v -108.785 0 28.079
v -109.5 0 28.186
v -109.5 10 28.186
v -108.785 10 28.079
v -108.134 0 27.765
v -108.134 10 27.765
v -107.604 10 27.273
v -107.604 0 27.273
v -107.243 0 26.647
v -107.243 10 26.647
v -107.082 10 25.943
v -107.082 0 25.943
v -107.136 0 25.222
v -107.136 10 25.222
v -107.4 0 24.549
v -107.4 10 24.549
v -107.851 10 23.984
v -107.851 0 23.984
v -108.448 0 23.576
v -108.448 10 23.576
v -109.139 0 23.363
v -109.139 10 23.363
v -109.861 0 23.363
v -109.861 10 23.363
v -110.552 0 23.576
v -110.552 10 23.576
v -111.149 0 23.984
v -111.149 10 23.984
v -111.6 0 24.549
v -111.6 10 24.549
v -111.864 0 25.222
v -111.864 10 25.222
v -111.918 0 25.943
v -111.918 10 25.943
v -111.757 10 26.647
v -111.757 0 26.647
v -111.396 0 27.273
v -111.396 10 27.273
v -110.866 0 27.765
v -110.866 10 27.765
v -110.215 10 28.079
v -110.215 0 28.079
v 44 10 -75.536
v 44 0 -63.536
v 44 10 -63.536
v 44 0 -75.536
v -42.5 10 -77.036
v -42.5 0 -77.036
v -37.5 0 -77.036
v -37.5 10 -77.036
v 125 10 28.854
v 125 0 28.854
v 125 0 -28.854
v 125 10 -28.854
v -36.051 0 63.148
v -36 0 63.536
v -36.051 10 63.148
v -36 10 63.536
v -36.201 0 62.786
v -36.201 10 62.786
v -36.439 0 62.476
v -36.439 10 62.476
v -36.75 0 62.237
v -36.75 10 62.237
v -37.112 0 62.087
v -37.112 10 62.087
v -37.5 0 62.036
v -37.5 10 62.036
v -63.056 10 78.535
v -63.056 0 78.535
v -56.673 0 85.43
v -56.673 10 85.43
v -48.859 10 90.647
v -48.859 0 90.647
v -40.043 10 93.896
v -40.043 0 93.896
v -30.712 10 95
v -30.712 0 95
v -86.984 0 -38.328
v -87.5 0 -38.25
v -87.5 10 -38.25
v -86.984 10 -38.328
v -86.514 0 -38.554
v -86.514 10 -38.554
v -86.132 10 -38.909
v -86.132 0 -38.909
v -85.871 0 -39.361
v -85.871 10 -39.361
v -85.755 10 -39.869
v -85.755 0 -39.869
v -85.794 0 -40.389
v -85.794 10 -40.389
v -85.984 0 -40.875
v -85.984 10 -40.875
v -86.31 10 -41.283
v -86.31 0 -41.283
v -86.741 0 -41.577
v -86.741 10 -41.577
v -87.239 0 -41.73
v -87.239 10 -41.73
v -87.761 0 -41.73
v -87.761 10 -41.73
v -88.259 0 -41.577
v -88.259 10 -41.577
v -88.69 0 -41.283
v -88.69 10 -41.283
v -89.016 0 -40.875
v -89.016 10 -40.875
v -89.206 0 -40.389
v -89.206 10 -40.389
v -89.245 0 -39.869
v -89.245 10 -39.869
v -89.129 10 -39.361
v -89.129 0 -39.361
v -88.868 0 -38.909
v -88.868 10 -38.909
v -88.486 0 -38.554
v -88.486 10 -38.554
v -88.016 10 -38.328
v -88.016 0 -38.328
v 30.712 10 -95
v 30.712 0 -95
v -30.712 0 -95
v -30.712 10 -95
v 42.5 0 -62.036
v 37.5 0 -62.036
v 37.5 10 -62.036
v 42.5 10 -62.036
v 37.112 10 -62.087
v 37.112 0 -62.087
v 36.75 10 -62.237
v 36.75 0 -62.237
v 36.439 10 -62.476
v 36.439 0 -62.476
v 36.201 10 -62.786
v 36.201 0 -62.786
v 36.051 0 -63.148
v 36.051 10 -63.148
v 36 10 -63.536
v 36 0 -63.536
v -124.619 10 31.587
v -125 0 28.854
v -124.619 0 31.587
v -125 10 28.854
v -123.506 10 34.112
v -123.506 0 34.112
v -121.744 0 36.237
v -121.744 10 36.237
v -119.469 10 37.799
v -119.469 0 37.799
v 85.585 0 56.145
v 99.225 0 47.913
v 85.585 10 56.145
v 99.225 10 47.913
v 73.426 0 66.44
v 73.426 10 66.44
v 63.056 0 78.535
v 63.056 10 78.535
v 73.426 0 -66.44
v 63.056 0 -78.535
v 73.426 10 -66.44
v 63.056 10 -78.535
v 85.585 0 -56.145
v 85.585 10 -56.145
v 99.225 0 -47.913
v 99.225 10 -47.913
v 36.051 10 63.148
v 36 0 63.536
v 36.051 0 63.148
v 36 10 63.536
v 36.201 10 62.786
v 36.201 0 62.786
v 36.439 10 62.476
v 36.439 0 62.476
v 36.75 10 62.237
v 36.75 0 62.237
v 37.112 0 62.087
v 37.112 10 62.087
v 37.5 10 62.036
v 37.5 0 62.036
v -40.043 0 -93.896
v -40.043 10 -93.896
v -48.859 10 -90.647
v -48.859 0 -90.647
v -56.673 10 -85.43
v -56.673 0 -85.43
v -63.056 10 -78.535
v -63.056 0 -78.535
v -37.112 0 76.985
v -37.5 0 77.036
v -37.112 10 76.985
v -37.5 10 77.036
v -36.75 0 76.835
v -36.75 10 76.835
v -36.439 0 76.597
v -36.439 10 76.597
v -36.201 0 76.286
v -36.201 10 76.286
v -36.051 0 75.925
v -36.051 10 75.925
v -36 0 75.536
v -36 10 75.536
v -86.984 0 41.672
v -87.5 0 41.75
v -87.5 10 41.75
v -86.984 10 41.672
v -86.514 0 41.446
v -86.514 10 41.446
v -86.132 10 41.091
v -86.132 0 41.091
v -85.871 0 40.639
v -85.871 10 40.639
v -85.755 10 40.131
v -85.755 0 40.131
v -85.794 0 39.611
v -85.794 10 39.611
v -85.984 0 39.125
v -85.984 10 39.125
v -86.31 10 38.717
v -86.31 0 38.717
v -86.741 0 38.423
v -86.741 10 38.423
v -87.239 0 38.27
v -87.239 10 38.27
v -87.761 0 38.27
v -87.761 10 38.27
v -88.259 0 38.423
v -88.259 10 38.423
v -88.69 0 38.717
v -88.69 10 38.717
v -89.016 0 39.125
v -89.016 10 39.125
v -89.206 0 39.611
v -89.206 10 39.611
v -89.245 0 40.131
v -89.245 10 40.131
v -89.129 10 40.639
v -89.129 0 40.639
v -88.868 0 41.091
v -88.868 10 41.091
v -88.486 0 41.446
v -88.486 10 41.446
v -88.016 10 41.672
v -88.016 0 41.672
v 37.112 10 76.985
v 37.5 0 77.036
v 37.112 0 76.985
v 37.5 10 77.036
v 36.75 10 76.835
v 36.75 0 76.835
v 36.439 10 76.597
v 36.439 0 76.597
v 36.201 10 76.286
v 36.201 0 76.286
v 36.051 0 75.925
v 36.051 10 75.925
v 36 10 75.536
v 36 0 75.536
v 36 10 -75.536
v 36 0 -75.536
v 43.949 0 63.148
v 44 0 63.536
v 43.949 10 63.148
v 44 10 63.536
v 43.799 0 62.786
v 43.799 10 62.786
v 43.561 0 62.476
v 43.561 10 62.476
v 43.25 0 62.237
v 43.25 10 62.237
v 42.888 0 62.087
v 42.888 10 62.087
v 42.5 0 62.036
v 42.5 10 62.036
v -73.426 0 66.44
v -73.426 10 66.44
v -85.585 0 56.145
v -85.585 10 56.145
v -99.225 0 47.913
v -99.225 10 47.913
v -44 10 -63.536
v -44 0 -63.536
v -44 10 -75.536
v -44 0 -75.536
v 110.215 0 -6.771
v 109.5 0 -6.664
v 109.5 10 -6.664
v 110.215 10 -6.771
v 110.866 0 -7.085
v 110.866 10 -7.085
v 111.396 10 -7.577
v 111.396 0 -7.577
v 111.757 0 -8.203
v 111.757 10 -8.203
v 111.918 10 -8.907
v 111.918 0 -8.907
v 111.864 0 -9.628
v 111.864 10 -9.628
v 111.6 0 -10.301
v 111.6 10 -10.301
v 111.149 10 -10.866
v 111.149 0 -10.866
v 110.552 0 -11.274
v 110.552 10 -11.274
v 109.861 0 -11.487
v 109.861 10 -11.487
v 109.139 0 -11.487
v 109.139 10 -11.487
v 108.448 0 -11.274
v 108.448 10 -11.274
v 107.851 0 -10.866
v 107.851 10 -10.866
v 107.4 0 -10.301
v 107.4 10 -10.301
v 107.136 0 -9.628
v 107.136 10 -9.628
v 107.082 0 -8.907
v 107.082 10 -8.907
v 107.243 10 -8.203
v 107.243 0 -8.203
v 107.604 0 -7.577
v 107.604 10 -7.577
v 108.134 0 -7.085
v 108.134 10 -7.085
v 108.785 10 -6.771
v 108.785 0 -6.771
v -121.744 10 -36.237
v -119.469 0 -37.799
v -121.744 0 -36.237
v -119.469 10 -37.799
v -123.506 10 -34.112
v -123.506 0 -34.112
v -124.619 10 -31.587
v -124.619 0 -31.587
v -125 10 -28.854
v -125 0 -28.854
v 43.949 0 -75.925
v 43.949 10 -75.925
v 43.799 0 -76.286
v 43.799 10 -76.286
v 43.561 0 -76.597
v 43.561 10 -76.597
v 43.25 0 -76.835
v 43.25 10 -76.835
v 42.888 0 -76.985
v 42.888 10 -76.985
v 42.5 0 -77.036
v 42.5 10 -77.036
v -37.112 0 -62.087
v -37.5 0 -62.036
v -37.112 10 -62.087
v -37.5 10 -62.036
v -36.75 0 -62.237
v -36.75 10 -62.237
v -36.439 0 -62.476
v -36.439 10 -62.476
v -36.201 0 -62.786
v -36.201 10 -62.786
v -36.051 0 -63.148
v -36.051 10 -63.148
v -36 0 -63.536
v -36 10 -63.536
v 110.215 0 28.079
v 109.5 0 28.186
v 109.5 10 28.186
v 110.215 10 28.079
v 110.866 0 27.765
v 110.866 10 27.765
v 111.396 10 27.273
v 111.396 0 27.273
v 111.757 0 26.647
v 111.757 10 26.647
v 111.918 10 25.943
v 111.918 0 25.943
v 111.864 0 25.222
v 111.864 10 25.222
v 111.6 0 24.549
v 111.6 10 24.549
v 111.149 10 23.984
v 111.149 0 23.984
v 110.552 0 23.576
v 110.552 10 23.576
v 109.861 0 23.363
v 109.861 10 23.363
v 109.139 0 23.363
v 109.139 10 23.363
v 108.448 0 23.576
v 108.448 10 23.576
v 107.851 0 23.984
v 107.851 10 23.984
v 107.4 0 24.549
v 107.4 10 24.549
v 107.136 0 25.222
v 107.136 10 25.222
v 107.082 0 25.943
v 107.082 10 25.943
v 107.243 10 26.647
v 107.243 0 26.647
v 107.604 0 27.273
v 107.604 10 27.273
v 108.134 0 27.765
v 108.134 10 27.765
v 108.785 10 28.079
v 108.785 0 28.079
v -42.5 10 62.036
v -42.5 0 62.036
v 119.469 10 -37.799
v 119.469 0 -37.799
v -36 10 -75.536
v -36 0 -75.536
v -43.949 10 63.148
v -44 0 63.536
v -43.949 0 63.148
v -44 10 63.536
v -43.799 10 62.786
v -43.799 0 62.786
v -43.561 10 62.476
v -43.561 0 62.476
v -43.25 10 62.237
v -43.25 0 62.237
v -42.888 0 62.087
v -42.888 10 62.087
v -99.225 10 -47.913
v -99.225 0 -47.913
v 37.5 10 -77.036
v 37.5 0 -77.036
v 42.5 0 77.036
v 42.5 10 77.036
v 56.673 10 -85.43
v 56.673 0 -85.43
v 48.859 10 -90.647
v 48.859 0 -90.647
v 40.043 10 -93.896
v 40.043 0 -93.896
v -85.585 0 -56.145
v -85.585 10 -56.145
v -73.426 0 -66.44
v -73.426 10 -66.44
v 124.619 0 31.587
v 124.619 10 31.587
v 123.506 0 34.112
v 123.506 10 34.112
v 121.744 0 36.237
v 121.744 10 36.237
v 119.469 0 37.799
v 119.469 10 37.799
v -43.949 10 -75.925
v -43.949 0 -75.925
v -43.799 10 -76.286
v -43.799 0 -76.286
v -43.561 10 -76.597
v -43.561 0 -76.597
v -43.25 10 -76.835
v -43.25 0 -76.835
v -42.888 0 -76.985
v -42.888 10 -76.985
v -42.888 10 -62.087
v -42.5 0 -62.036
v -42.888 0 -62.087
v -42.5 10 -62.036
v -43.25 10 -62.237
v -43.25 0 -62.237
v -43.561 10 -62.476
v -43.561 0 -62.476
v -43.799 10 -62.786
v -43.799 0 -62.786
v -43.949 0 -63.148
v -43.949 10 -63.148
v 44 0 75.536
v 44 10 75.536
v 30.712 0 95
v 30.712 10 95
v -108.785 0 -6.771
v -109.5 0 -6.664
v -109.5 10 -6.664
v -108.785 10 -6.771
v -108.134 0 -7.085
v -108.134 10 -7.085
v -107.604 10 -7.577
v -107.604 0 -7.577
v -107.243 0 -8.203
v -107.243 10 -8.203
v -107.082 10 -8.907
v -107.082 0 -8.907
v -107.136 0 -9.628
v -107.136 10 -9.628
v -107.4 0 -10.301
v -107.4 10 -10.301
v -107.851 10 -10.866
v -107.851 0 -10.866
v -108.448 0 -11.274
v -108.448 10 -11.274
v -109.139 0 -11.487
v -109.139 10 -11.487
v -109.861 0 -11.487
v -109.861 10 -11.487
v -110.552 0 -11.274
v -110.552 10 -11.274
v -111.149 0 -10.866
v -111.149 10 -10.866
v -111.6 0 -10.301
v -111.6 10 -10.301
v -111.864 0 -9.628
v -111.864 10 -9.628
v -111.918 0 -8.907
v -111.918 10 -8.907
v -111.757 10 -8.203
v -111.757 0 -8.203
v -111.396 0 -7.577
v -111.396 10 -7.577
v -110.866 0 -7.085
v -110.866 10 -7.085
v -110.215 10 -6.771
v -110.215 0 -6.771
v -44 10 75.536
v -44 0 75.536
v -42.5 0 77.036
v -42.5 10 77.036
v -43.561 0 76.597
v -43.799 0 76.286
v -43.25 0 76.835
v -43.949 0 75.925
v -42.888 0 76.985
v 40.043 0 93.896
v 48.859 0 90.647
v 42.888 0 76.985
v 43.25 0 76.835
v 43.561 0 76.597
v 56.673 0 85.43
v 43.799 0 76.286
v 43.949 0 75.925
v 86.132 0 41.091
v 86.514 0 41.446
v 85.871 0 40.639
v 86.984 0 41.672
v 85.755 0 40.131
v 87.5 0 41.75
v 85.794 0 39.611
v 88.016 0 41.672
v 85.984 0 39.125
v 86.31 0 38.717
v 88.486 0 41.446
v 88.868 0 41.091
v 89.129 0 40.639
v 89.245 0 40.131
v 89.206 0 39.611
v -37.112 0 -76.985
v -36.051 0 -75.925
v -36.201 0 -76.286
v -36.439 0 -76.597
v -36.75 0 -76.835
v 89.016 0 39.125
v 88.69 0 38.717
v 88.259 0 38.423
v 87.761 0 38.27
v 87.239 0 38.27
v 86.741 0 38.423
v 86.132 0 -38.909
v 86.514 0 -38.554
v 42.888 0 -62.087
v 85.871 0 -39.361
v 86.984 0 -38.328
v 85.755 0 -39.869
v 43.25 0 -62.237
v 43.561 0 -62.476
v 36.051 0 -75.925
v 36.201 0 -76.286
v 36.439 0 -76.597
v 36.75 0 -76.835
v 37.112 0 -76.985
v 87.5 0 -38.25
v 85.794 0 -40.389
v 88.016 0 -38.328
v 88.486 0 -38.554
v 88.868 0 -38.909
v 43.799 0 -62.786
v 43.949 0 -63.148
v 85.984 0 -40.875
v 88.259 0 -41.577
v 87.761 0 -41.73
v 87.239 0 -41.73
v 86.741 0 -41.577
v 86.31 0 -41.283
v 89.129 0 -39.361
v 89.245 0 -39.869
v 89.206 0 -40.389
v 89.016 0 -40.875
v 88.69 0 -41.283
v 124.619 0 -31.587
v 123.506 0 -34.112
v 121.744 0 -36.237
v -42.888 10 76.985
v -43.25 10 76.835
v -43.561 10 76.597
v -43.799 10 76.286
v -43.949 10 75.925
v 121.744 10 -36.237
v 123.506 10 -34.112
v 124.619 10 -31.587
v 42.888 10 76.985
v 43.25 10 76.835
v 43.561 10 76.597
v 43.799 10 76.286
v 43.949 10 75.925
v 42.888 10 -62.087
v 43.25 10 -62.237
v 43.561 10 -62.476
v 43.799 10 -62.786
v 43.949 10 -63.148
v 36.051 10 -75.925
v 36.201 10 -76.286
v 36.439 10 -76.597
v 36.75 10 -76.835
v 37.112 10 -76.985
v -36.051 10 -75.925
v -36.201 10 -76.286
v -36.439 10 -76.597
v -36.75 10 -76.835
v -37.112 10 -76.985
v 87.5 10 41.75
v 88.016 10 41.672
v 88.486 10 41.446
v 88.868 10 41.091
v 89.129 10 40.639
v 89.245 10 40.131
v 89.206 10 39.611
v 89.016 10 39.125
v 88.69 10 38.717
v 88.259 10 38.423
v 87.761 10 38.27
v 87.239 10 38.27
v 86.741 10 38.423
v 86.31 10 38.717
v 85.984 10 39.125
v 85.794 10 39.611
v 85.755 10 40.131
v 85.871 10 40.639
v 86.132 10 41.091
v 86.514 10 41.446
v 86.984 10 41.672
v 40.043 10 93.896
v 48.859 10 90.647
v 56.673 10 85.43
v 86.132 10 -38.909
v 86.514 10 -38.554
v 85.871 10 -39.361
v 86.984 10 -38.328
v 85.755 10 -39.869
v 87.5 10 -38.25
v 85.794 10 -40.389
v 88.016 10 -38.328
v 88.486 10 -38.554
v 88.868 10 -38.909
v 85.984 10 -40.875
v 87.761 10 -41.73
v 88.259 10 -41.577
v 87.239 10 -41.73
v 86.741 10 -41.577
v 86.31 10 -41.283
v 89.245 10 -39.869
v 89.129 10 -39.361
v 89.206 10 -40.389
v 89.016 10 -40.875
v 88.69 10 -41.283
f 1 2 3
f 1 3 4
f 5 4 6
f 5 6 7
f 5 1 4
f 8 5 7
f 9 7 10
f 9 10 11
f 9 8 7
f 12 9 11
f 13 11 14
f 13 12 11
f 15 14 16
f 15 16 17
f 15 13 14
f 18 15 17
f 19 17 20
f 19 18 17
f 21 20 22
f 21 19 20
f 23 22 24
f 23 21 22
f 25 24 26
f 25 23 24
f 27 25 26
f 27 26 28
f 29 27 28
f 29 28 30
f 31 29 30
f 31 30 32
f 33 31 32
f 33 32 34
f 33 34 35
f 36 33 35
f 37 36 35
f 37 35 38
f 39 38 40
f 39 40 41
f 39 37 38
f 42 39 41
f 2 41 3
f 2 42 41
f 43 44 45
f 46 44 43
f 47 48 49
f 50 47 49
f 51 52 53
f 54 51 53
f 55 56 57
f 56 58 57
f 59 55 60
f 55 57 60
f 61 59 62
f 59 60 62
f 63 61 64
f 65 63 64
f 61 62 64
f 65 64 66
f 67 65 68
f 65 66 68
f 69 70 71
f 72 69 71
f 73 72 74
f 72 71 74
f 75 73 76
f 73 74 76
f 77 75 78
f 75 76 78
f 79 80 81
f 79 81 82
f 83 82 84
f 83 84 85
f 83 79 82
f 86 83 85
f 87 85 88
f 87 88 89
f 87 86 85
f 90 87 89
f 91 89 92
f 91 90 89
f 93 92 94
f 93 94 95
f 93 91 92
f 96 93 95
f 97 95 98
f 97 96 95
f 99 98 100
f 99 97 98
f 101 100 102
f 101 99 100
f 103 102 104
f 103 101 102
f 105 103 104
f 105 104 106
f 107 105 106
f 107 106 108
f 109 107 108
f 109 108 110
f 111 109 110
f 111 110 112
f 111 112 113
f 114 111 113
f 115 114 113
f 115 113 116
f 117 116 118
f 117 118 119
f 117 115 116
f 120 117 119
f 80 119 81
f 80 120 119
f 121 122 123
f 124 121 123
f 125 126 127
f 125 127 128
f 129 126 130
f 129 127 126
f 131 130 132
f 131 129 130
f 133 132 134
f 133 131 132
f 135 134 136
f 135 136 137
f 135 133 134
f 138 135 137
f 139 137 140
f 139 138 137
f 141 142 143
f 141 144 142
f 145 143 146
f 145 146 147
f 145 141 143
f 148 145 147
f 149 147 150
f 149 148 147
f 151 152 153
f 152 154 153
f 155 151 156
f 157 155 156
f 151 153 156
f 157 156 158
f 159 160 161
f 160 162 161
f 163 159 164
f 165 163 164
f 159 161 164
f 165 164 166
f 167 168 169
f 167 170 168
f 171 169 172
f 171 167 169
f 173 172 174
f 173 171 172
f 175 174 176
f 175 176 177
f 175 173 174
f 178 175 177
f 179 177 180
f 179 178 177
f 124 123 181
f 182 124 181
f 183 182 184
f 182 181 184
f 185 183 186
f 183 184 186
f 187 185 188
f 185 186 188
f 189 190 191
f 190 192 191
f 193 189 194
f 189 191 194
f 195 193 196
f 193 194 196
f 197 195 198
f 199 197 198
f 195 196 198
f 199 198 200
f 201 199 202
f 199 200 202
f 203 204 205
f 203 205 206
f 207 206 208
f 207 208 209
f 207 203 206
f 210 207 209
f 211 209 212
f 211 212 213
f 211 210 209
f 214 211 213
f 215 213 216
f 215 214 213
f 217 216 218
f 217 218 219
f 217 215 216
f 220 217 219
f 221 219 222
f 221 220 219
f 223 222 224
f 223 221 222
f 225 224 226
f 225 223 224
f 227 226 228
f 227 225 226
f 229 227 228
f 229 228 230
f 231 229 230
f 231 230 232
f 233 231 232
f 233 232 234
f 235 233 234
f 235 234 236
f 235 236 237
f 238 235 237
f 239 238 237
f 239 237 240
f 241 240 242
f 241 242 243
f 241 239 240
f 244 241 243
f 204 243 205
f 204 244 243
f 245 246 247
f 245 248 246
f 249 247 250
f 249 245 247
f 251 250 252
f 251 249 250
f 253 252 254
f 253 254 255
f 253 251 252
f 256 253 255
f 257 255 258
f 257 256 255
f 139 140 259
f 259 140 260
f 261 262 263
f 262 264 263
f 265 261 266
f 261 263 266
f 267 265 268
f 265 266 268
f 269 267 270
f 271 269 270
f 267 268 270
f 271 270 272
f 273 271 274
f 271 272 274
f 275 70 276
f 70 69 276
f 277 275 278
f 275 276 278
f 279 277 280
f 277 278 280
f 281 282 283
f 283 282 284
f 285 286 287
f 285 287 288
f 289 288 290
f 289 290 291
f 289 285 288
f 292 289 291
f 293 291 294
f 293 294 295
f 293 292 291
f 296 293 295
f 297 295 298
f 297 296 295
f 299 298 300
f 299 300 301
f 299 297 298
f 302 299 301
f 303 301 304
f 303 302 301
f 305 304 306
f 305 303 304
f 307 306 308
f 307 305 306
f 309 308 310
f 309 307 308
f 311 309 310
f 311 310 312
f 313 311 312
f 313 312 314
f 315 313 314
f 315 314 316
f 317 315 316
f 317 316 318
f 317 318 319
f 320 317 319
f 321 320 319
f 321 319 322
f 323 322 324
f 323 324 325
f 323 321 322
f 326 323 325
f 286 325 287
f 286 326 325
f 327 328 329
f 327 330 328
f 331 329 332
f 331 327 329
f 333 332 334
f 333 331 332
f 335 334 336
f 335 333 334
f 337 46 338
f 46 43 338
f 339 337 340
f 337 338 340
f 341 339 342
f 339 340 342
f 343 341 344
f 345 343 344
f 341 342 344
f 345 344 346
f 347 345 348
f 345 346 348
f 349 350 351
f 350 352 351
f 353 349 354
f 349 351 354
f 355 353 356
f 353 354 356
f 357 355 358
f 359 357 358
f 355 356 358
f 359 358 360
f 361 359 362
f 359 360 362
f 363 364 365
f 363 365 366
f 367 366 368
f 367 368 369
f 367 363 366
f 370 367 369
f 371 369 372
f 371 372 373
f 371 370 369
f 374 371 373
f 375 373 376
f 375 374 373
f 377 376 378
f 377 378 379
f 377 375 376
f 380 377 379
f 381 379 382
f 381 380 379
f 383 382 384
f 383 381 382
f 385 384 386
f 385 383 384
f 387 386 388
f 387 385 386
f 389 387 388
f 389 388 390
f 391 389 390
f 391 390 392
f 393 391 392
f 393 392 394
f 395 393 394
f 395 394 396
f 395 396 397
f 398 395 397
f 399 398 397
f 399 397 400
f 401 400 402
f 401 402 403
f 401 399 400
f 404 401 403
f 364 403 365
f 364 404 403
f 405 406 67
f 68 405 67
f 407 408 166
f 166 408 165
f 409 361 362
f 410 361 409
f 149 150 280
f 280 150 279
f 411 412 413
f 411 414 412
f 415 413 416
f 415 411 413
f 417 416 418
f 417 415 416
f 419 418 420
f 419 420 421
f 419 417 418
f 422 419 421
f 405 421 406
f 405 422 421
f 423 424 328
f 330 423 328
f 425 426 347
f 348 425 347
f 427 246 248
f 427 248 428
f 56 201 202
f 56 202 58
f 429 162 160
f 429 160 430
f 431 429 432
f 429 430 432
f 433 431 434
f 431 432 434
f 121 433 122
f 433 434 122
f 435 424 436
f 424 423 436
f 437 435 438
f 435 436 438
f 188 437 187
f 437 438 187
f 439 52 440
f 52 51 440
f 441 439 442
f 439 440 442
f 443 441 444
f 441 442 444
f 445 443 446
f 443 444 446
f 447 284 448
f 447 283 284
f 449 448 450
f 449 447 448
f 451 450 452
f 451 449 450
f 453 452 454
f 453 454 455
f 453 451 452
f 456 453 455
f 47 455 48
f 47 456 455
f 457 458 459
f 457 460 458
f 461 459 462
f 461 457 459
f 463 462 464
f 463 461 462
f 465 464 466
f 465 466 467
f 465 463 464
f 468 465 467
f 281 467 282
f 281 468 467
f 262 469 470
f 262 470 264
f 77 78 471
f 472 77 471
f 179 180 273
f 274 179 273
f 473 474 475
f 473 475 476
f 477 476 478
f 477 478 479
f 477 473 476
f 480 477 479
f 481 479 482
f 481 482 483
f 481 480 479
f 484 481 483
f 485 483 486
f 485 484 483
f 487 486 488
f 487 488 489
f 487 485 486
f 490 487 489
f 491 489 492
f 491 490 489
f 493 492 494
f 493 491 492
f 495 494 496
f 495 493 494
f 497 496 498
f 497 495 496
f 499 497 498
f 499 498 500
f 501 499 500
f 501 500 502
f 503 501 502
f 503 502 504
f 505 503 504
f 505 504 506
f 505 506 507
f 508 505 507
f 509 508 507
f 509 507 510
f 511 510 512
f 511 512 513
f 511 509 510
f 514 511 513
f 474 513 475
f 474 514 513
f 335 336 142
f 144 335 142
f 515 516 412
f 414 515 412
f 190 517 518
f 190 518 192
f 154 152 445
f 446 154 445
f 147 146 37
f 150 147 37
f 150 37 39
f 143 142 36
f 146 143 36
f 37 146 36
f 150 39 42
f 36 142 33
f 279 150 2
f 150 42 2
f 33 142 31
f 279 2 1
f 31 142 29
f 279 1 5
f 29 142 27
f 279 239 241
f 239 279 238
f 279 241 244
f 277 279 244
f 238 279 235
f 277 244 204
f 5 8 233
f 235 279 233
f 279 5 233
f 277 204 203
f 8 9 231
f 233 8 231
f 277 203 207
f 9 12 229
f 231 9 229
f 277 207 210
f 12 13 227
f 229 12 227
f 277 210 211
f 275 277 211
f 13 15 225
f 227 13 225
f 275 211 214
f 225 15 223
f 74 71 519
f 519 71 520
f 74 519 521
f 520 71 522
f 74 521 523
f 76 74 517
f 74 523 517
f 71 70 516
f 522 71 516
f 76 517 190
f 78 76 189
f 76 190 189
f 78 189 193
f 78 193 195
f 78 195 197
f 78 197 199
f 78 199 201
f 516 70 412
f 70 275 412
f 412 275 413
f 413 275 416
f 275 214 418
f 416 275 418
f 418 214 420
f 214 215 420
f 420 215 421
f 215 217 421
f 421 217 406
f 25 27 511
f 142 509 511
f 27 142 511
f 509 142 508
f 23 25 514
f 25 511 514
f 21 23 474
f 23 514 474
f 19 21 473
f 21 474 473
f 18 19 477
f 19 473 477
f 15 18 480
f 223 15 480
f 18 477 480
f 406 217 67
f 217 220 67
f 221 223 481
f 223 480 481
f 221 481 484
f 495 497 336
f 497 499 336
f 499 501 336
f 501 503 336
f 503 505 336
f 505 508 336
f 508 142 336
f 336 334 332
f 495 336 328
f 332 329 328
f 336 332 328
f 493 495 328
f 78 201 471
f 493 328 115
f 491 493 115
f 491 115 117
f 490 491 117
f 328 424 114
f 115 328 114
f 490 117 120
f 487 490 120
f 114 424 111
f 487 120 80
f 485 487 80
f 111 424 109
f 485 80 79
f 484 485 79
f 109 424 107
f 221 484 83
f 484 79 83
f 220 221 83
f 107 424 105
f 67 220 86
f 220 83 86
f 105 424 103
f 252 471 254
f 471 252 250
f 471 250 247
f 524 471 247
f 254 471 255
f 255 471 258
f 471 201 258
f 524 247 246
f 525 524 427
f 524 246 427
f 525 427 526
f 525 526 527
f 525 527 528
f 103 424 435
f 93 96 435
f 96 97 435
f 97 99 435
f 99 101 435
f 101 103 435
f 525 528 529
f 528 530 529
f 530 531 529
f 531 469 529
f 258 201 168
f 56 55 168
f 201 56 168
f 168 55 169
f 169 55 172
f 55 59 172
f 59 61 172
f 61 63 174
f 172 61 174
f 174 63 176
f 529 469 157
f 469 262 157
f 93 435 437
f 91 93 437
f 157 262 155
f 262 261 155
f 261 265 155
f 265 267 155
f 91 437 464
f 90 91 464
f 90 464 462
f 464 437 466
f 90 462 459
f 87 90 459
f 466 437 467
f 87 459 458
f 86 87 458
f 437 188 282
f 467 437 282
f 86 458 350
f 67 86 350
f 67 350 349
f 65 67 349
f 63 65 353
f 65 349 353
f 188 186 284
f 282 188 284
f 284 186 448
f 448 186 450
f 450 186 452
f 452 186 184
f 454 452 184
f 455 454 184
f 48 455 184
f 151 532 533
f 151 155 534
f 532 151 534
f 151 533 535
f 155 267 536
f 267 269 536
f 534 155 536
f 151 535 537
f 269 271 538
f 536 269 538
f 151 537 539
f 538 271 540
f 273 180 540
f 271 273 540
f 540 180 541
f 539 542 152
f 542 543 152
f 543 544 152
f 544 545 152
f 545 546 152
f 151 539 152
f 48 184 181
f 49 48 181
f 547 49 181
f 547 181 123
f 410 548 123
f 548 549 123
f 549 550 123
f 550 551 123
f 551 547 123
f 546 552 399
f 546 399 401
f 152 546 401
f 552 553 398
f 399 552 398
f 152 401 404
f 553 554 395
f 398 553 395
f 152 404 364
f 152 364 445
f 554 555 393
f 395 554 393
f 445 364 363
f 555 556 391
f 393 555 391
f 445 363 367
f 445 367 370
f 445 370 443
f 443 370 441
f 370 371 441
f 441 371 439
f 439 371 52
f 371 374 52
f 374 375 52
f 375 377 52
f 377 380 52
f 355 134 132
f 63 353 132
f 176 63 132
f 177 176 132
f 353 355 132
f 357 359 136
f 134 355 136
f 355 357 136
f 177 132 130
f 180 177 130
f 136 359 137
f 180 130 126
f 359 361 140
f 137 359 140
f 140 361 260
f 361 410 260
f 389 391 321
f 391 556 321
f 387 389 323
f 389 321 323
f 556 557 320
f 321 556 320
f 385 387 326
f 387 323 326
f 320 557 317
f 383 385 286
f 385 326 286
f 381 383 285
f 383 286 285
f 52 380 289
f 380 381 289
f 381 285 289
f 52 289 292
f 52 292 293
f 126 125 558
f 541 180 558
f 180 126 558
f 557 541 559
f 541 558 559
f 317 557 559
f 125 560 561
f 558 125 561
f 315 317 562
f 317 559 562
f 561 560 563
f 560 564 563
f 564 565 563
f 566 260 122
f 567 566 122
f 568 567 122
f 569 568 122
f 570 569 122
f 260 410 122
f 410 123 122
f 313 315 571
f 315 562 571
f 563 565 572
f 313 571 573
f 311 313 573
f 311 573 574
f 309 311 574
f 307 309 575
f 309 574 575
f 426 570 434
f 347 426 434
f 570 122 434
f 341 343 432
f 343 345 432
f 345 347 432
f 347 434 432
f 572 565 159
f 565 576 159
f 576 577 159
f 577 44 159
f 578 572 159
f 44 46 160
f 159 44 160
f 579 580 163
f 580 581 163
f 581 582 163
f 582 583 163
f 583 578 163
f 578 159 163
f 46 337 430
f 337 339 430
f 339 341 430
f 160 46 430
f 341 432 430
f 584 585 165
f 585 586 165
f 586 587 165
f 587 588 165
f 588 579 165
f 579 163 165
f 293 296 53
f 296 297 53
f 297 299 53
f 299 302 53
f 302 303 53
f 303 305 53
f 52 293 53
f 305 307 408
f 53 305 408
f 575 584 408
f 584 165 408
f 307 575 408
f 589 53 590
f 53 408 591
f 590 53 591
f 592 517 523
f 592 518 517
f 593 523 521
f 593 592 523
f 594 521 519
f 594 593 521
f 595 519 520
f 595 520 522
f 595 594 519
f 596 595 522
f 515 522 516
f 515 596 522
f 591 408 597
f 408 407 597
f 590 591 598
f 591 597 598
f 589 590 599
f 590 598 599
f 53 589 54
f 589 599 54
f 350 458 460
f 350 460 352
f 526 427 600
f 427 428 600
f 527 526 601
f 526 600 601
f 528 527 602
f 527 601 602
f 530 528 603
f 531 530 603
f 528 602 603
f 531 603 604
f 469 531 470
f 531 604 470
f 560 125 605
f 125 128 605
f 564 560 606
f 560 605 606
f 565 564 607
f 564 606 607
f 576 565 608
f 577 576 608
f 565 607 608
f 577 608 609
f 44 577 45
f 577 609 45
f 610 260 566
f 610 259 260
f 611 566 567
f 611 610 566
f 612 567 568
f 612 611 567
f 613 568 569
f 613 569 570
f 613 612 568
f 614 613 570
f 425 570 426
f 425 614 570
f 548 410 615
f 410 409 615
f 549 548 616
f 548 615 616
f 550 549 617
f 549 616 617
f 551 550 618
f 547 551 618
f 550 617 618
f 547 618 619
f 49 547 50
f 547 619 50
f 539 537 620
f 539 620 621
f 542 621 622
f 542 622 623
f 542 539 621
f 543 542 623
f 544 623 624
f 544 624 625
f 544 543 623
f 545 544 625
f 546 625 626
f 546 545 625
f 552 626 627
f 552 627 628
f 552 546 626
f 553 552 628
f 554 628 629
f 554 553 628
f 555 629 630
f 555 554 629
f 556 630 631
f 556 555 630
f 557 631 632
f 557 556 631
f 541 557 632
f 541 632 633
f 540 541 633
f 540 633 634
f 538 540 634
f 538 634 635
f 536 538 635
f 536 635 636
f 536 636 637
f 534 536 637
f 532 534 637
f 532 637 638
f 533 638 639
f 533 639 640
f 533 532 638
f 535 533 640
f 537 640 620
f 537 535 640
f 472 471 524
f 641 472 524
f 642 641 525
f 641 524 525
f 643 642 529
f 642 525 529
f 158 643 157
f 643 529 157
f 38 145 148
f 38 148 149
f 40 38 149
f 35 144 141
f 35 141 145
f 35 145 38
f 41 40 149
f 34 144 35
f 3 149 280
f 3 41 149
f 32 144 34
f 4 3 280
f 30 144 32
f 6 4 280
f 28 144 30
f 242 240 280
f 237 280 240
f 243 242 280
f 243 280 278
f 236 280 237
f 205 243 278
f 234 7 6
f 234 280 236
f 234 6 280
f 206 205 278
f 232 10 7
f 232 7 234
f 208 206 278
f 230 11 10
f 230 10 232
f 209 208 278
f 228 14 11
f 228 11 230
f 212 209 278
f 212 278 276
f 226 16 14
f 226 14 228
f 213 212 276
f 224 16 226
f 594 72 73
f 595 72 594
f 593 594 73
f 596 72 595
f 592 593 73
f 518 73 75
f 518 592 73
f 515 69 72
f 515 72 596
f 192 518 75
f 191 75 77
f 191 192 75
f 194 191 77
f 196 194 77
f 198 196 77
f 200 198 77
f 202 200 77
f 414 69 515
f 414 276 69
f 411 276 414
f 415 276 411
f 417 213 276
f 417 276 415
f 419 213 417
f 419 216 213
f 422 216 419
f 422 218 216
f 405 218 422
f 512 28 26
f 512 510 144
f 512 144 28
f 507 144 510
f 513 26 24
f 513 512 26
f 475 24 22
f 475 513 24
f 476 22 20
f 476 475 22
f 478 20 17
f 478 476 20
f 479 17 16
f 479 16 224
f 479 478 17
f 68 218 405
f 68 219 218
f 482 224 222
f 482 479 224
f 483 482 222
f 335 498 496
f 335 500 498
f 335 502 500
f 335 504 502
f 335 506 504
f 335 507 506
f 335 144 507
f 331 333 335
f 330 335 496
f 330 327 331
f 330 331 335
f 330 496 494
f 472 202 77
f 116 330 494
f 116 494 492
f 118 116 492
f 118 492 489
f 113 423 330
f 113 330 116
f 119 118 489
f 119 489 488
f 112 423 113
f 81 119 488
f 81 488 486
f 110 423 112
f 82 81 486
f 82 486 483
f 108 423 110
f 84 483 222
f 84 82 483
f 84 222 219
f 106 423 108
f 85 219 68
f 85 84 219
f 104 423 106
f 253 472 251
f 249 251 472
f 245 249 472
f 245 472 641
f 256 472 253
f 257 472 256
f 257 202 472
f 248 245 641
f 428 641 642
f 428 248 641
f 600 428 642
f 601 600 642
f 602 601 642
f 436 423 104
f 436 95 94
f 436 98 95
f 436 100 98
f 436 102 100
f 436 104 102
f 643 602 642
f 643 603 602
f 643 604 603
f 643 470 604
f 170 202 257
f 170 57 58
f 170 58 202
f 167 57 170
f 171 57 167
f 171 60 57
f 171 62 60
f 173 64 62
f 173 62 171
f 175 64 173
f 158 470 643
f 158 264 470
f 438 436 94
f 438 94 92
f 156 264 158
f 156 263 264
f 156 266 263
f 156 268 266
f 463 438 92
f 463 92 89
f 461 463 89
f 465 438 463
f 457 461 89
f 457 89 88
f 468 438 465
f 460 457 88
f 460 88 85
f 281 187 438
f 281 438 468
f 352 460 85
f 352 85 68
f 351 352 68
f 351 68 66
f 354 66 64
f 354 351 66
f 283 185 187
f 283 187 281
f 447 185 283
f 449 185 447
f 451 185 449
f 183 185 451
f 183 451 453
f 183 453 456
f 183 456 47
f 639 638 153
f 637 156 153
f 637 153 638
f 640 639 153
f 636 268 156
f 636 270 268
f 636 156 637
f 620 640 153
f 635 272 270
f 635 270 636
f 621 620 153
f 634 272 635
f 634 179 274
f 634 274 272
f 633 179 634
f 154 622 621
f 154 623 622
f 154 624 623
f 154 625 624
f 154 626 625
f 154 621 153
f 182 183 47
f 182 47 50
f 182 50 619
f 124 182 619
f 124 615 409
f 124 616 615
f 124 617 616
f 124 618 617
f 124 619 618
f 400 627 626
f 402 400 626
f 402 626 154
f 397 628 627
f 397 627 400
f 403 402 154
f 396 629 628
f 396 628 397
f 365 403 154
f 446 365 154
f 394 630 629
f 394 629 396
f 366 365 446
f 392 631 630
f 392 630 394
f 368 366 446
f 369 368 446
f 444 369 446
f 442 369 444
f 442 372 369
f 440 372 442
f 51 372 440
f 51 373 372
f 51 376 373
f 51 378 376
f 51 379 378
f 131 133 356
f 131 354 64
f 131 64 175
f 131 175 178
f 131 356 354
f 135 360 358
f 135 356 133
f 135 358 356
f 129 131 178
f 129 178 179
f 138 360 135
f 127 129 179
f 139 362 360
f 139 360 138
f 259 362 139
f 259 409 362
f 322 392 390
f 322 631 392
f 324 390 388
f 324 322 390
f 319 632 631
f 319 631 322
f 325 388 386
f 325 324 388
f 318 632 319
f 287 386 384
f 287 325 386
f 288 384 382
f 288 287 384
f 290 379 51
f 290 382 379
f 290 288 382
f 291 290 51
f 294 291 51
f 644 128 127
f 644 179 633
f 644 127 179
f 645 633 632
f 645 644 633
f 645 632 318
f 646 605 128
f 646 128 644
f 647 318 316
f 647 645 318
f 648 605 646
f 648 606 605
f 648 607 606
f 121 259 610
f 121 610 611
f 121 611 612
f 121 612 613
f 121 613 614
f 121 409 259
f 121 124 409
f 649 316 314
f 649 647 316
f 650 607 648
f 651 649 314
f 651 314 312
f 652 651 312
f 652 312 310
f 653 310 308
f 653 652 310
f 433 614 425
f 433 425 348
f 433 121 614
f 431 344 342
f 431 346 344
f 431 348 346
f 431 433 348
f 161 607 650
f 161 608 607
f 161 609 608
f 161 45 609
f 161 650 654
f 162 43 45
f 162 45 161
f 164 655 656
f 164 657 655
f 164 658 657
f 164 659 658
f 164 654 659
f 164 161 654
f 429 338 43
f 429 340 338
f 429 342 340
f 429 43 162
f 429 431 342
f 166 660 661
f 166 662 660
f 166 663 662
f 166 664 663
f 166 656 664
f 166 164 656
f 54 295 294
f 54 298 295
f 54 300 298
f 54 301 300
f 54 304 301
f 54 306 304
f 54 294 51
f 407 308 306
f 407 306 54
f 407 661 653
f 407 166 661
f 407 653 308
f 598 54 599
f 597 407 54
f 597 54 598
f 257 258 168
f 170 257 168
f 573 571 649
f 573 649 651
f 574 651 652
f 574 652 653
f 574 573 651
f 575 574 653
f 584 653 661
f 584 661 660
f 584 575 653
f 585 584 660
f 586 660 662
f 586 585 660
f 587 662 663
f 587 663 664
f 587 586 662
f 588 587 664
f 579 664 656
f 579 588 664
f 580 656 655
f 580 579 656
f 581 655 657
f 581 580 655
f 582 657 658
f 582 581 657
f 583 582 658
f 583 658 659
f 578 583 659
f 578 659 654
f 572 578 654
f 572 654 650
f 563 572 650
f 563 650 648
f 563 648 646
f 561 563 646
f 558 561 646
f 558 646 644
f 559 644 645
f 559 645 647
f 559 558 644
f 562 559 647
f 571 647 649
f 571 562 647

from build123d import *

# Parameters (mm, degrees)
SKETCH2_W           = 8
SKETCH2_H           = 15
SKETCH2_R           = 1.75
SKETCH2_R_2         = 2.425
BOSS_EXTRUDE1_DEPTH = 10
FILLET1_R           = 10
FILLET2_R           = 40
FILLET4_R           = 1.5
FILLET3_R           = 100


with BuildPart() as part:
    # Sketch2 → Boss-Extrude1 (new body)
    with BuildSketch(Plane(origin=(0, 0, 0), x_dir=(1, 0, 0), z_dir=(0, 1, 0))):
        Polygon((70, 95), (-70, 95), (-70, 62.51255638), (-125, 35.036306), (-125, -35.036306), (-70, -62.51255638), (-70, -95), (70, -95), (70, -62.51255638), (125, -35.036306), (125, 35.036306), (70, 62.51255638), align=None)
        with Locations((-40, -69.536306)):
            Rectangle(SKETCH2_W, SKETCH2_H, mode=Mode.SUBTRACT)
        with Locations(Location((-87.5, -40, 0), (0, 0, 270))):
            Circle(SKETCH2_R, mode=Mode.SUBTRACT)
        with Locations(Location((-109.5, -25.761306, 0), (0, 0, 270))):
            Circle(SKETCH2_R_2, mode=Mode.SUBTRACT)
        with Locations((40, -69.536306)):
            Rectangle(SKETCH2_W, SKETCH2_H, mode=Mode.SUBTRACT)
        with Locations(Location((87.5, -40, 0), (0, 0, 270))):
            Circle(SKETCH2_R, mode=Mode.SUBTRACT)
        with Locations(Location((109.5, -25.761306, 0), (0, 0, 270))):
            Circle(SKETCH2_R_2, mode=Mode.SUBTRACT)
        with Locations(Location((-109.5, 9.088694, 0), (0, 0, 270))):
            Circle(SKETCH2_R_2, mode=Mode.SUBTRACT)
        with Locations(Location((-87.5, 40, 0), (0, 0, 270))):
            Circle(SKETCH2_R, mode=Mode.SUBTRACT)
        with Locations((-40, 69.536306)):
            Rectangle(SKETCH2_W, SKETCH2_H, mode=Mode.SUBTRACT)
        with Locations(Location((109.5, 9.088694, 0), (0, 0, 270))):
            Circle(SKETCH2_R_2, mode=Mode.SUBTRACT)
        with Locations((40, 69.536306)):
            Rectangle(SKETCH2_W, SKETCH2_H, mode=Mode.SUBTRACT)
        with Locations(Location((87.5, 40, 0), (0, 0, 270))):
            Circle(SKETCH2_R, mode=Mode.SUBTRACT)
    extrude(amount=BOSS_EXTRUDE1_DEPTH)

    # Fillet1
    fillet1_edges = [part.edges().sort_by_distance(p)[0] for p in [
        (125, 5, 35.036306),
        (-125, 5, 35.036306),
        (-125, 5, -35.036306),
        (125, 5, -35.036306),
    ]]
    fillet(fillet1_edges, radius=FILLET1_R)

    # Fillet2
    # the kernel refuses this fillet: 40 mm, written as the material it takes off along each edge
    with BuildSketch(Plane(origin=(-70, -98.220463011, 95), x_dir=(0, 0, -1), z_dir=(0, 1, 0))) as fillet2_piece_1:
        with BuildLine():
            CenterArc((40, -39.288185204), FILLET2_R, 100.825233866, 79.174766134)
            Line((0, -39.288185204), (-0.8, -39.288185204))
            Line((-0.8, -39.288185204), (-0.8, 0))
            Line((-0.8, 0), (0, 0.8))
            ThreePointArc((0, 0.8), (16.24372181, 0.8), (32.337192493, 0.785763704))
            Line((32.337192493, 0.785763704), (32.48744362, 0))
        make_face()
    extrude(amount=206.440926021, mode=Mode.SUBTRACT)
    with BuildSketch(Plane(origin=(70, -98.220463011, 95), x_dir=(-1, 0, 0), z_dir=(0, 1, 0))) as fillet2_piece_2:
        with BuildLine():
            CenterArc((39.288185204, -40), FILLET2_R, 90, 79.174766134)
            Line((0, -32.48744362), (-0.785763704, -32.337192493))
            ThreePointArc((-0.785763704, -32.337192493), (-0.8, -16.24372181), (-0.8, 0))
            Line((-0.8, 0), (0, 0.8))
            Line((0, 0.8), (39.288185204, 0.8))
            Line((39.288185204, 0.8), (39.288185204, 0))
        make_face()
    extrude(amount=206.440926021, mode=Mode.SUBTRACT)
    with BuildSketch(Plane(origin=(70, -98.220463011, -95), x_dir=(-1, 0, 0), z_dir=(0, 1, 0))) as fillet2_piece_3:
        with BuildLine():
            CenterArc((39.288185204, 40), FILLET2_R, 190.825233866, 79.174766134)
            Line((0, 32.48744362), (-0.785763704, 32.337192493))
            ThreePointArc((-0.785763704, 32.337192493), (-0.8, 16.24372181), (-0.8, 0))
            Line((-0.8, 0), (0, -0.8))
            Line((0, -0.8), (39.288185204, -0.8))
            Line((39.288185204, -0.8), (39.288185204, 0))
        make_face()
    extrude(amount=206.440926021, mode=Mode.SUBTRACT)
    with BuildSketch(Plane(origin=(-70, -98.220463011, -95), x_dir=(0, 0, 1), z_dir=(0, 1, 0))) as fillet2_piece_4:
        with BuildLine():
            CenterArc((40, 39.288185204), FILLET2_R, 180, 79.174766134)
            Line((0, 39.288185204), (-0.8, 39.288185204))
            Line((-0.8, 39.288185204), (-0.8, 0))
            Line((-0.8, 0), (0, -0.8))
            ThreePointArc((0, -0.8), (16.24372181, -0.8), (32.337192493, -0.785763704))
            Line((32.337192493, -0.785763704), (32.48744362, 0))
        make_face()
    extrude(amount=206.440926021, mode=Mode.SUBTRACT)

    # Fillet4
    fillet4_edges = [part.edges().sort_by_distance(p)[0] for p in [
        (36, 5, 62.036306),
        (36, 5, 77.036306),
        (44, 5, 77.036306),
        (44, 5, 62.036306),
        (-36, 5, 62.036306),
        (-44, 5, 62.036306),
        (-44, 5, 77.036306),
        (-36, 5, 77.036306),
        (36, 5, -77.036306),
        (36, 5, -62.036306),
        (44, 5, -62.036306),
        (44, 5, -77.036306),
        (-44, 5, -77.036306),
        (-44, 5, -62.036306),
        (-36, 5, -62.036306),
        (-36, 5, -77.036306),
    ]]
    fillet(fillet4_edges, radius=FILLET4_R)

    # Fillet3
    fillet3_edges = [part.edges().sort_by_distance(p)[0] for p in [
        (70, 5, 62.51255638),
        (-70, 5, 62.51255638),
        (-70, 5, -62.51255638),
        (70, 5, -62.51255638),
    ]]
    fillet(fillet3_edges, radius=FILLET3_R)


solid = part.part
